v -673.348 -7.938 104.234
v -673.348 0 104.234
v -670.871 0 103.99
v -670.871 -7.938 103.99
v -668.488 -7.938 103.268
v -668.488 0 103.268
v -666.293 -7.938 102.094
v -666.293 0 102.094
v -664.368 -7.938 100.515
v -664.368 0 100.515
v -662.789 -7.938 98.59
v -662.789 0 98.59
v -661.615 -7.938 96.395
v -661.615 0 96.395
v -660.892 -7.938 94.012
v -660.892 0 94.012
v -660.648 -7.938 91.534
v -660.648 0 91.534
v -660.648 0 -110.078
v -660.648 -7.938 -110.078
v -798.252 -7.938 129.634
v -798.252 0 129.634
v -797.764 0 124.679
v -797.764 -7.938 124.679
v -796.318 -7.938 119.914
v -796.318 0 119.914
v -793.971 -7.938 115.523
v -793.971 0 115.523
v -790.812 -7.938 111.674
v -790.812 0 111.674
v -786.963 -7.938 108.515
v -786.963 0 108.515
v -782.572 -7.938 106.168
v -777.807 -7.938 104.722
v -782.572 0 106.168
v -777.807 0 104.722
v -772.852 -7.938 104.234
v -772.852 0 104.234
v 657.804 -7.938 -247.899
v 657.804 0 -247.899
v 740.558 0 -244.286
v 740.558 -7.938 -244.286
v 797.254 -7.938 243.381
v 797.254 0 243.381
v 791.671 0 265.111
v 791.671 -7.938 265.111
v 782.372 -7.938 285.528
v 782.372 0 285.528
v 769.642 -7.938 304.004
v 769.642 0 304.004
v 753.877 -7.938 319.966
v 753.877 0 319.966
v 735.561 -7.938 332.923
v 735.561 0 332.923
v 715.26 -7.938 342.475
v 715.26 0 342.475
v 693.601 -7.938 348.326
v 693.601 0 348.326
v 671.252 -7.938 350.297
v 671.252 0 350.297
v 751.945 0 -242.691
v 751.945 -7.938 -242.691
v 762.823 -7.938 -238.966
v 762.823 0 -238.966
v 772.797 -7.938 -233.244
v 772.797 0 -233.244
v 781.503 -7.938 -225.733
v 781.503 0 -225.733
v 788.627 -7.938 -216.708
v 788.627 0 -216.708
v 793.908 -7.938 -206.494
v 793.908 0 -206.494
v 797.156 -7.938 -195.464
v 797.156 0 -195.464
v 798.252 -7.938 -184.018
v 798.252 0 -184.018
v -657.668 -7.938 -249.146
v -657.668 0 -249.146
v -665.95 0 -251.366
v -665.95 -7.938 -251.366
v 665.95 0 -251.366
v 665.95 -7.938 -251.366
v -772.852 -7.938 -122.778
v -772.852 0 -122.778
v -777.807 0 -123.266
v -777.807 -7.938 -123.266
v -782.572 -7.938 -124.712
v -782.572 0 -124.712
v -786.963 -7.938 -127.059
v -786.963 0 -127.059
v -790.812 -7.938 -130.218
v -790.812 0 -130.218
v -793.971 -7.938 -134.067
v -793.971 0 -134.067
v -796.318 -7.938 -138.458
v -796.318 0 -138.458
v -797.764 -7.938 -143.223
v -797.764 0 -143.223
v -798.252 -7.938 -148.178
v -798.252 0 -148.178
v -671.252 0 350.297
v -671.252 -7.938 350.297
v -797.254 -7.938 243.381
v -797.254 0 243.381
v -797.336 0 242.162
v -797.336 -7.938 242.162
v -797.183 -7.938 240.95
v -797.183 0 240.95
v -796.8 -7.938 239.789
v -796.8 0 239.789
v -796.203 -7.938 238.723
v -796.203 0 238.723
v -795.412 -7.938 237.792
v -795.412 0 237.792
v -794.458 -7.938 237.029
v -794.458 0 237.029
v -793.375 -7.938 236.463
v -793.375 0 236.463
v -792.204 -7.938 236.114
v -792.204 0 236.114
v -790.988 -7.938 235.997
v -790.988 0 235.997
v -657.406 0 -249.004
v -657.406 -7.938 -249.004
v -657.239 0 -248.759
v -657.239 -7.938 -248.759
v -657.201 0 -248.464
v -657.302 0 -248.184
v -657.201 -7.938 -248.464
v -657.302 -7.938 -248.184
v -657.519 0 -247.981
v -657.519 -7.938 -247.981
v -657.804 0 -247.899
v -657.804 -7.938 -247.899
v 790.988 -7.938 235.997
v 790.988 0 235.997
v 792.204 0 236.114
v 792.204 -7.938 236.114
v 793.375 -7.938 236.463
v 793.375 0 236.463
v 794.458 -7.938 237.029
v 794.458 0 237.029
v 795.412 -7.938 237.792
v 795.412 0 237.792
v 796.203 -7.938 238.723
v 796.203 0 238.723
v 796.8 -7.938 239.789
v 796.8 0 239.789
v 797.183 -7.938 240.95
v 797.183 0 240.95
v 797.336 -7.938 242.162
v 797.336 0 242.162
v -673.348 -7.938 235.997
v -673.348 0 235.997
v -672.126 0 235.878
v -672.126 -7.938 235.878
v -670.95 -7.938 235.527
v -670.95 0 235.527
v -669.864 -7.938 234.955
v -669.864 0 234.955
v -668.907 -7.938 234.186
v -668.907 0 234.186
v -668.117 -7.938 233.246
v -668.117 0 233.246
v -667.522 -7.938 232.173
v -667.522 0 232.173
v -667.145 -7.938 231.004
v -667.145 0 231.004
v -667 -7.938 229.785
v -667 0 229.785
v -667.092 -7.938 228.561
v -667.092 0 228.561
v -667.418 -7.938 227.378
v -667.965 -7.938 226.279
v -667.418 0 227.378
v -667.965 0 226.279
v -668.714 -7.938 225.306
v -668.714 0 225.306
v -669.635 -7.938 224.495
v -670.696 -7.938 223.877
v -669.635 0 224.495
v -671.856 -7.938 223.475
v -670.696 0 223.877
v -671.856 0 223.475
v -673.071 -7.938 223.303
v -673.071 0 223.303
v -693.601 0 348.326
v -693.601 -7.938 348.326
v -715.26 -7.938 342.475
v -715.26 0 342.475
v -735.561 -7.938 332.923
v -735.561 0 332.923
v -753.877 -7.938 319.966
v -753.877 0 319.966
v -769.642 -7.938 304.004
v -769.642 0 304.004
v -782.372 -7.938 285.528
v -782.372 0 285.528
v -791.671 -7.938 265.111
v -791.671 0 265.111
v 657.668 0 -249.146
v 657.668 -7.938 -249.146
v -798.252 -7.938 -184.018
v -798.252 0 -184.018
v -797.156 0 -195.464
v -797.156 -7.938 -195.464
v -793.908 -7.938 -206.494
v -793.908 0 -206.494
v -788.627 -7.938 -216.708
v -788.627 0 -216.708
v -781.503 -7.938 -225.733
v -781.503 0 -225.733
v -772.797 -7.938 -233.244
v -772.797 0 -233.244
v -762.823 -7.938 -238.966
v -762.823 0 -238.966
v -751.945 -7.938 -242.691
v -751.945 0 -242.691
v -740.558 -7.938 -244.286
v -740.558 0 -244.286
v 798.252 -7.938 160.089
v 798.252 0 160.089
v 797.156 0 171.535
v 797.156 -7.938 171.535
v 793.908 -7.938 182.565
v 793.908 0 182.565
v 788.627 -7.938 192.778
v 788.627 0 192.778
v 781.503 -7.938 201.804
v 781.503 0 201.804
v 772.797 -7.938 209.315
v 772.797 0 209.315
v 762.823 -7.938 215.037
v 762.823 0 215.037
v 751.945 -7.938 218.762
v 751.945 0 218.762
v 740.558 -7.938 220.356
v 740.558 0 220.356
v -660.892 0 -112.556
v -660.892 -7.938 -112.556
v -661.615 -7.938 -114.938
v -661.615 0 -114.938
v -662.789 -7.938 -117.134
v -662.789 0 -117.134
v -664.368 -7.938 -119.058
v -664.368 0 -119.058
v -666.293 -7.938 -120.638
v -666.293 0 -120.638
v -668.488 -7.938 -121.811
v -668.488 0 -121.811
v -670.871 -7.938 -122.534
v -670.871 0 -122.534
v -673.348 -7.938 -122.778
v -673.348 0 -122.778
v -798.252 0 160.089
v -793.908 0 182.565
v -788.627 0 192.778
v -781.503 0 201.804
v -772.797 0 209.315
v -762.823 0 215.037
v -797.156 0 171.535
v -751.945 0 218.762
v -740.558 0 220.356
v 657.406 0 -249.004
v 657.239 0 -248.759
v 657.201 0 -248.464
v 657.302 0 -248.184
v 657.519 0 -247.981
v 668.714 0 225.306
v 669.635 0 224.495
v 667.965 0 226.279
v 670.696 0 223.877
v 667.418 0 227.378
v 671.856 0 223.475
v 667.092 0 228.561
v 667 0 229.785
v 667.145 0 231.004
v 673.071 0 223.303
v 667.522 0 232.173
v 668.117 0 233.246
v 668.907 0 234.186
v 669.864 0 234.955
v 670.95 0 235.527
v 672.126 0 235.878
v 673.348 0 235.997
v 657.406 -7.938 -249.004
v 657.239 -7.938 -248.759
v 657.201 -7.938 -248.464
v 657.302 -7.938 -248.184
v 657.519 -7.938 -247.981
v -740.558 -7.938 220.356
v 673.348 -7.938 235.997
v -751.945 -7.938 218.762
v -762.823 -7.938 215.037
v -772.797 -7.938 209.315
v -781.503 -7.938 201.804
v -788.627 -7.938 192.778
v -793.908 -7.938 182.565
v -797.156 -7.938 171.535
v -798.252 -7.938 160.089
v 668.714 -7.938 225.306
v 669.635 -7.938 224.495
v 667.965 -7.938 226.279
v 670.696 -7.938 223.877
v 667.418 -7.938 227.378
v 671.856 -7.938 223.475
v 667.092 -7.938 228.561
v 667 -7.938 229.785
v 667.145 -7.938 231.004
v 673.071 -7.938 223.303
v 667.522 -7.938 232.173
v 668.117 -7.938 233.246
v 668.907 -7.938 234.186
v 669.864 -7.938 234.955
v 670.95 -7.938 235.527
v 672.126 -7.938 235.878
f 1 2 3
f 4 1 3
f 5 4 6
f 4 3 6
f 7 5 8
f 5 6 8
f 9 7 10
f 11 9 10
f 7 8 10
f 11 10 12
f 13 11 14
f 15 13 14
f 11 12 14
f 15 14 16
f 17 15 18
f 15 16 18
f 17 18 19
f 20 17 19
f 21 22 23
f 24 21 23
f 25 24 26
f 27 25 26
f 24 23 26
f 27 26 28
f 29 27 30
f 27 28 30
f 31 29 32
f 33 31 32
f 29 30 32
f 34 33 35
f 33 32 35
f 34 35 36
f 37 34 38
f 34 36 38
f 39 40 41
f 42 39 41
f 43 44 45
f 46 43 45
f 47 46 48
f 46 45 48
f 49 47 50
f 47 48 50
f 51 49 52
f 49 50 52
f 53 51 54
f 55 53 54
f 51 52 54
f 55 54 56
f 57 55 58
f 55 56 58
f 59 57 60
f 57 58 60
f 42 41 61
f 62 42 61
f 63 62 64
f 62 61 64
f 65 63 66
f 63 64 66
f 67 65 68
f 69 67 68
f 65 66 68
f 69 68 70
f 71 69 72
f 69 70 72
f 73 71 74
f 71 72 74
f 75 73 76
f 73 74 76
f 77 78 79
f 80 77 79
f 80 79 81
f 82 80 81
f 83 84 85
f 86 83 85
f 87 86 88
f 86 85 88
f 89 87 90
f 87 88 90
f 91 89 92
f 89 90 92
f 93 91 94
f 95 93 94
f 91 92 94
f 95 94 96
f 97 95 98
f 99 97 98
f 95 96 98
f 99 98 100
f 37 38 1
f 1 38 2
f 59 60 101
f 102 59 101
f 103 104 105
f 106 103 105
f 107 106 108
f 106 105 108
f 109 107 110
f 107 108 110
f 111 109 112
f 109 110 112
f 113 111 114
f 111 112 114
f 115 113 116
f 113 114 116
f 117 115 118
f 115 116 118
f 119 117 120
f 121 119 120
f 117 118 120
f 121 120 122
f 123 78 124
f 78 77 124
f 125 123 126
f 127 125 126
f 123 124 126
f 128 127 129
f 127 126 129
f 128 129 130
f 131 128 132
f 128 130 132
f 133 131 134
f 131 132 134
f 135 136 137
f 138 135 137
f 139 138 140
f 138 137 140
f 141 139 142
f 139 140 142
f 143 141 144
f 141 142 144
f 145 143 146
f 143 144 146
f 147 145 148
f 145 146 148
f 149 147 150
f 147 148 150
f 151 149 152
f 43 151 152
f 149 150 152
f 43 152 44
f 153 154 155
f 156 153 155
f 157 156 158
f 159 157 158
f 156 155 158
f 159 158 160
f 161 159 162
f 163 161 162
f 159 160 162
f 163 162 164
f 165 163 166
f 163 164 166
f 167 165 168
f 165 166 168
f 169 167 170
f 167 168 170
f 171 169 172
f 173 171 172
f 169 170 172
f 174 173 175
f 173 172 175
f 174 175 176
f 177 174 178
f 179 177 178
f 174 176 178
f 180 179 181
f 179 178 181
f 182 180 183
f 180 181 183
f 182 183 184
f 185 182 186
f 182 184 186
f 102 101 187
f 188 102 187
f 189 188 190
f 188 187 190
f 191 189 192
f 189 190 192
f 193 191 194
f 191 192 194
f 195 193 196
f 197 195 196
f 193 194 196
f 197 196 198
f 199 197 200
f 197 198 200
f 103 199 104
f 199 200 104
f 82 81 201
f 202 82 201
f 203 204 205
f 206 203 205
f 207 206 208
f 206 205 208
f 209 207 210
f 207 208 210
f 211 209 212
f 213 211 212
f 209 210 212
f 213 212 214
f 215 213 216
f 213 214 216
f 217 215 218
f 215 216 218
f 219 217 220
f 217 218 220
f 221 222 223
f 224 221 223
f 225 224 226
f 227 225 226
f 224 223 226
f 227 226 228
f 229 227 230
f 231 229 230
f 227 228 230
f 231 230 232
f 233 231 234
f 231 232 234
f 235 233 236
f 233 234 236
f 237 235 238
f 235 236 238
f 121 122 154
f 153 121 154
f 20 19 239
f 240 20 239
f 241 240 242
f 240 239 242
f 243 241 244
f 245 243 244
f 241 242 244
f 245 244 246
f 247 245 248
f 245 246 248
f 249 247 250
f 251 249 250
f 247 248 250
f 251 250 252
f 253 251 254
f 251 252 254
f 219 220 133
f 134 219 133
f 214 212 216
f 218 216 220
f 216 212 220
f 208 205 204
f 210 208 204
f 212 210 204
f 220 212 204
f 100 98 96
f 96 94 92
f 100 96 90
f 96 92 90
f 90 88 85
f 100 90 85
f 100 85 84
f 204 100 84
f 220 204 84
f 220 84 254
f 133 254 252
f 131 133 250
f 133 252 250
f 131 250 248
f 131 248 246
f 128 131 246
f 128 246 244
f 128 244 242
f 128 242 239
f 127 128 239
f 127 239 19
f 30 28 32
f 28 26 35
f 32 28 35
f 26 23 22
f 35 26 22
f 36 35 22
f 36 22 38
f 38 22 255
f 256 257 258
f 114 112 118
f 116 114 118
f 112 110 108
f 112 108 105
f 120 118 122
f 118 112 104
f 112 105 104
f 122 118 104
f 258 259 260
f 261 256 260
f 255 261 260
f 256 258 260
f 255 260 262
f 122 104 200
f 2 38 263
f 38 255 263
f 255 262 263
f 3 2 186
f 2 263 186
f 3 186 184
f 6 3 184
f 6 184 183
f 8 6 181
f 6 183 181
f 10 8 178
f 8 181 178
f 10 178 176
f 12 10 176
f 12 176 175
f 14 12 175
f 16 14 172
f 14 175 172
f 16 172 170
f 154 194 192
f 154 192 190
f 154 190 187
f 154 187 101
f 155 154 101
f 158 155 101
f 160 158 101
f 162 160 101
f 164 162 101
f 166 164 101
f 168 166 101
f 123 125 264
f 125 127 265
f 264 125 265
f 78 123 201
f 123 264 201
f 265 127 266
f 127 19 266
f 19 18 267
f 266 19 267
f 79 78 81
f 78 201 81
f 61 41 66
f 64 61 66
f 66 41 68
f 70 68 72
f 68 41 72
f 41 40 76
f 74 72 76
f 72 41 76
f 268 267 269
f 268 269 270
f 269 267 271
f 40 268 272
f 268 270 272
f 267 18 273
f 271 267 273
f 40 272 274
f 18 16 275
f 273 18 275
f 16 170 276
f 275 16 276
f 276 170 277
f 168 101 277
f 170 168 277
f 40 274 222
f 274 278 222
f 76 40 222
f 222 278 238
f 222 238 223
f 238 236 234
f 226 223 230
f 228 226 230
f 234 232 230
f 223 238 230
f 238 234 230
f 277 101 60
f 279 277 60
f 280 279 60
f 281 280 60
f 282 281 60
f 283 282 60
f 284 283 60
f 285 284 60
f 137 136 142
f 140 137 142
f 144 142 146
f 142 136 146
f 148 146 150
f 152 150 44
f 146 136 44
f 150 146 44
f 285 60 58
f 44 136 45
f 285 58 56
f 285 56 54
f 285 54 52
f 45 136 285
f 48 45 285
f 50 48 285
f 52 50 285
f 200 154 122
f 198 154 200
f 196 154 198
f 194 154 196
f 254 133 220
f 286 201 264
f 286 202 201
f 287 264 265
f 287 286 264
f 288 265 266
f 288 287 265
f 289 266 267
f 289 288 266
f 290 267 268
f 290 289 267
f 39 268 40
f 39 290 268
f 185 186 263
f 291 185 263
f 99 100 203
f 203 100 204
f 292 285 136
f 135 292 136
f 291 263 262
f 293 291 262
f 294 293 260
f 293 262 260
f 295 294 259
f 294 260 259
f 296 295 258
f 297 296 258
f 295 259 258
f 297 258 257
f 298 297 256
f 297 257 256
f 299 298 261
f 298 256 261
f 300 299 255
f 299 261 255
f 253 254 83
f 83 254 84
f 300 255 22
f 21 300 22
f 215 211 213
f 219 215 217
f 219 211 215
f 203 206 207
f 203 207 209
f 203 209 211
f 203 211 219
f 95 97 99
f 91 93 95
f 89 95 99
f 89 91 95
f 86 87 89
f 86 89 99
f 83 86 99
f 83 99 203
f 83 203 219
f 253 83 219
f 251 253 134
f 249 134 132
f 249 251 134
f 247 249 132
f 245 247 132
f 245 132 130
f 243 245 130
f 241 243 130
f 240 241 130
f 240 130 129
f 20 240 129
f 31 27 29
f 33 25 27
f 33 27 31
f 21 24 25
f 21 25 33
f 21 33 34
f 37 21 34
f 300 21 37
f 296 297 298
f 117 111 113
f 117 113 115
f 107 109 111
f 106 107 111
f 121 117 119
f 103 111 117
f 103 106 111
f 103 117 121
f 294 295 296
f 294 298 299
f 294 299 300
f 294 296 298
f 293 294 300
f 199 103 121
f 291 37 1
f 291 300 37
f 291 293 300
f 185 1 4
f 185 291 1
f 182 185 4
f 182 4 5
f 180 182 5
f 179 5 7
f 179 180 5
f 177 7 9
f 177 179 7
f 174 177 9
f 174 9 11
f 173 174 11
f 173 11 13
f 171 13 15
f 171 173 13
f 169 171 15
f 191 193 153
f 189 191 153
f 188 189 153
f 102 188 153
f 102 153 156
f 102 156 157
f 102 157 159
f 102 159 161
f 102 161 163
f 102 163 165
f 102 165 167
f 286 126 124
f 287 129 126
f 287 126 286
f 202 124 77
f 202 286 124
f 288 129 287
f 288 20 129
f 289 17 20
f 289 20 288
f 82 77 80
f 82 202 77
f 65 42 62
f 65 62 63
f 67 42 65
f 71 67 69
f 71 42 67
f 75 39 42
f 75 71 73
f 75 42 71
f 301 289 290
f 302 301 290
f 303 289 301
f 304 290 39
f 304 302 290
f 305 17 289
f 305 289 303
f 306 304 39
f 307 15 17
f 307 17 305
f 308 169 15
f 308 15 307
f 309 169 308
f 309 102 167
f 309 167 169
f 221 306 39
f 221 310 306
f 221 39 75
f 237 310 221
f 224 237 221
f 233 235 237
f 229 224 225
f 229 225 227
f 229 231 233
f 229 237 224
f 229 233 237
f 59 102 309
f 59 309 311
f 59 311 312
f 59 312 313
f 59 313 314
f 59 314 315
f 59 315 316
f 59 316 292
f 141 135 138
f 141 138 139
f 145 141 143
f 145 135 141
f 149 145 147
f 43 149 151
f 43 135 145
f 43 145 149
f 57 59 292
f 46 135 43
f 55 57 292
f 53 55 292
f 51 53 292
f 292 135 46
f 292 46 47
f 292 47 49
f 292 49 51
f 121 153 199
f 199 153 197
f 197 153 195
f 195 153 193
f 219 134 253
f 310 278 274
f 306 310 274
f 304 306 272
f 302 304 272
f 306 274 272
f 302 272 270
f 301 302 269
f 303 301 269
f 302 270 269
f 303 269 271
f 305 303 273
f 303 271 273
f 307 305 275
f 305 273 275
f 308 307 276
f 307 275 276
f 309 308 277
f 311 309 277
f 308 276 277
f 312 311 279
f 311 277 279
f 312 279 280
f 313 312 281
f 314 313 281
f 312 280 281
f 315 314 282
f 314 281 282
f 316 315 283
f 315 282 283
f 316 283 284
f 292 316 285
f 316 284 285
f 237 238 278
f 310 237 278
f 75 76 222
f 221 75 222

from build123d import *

# Parameters (mm, degrees)
F1_DEPTH = 7.9375
F2_R     = 0.635


with BuildPart() as f1:
    # F0 (on Front) → F1 (new body)
    with BuildSketch(Plane.XZ):
        with BuildLine():
            Line((-653.682642, -248.07856), (-665.9499, -251.365562))
            Line((-665.9499, -251.365562), (665.9499, -251.365562))
            Line((665.9499, -251.365562), (653.682642, -248.07856))
            Line((653.682642, -248.07856), (740.557894, -244.285505))
            ThreePointArc((740.557894, -244.285505), (781.50316, -225.733446), (798.251554, -184.017921))
            Line((798.251554, -184.017921), (798.251554, 160.088868))
            ThreePointArc((798.251554, 160.088868), (781.50316, 201.804393), (740.557894, 220.356452))
            Line((740.557894, 220.356452), (673.071263, 223.302982))
            ThreePointArc((673.071263, 223.302982), (666.999757, 229.785462), (673.348246, 235.996938))
            Line((673.348246, 235.996938), (790.988303, 235.996938))
            ThreePointArc((790.988303, 235.996938), (795.830132, 238.238509), (797.253598, 243.380659))
            ThreePointArc((797.253598, 243.380659), (753.87662, 319.965956), (671.251554, 350.296938))
            Line((671.251554, 350.296938), (-671.251554, 350.296938))
            ThreePointArc((-671.251554, 350.296938), (-753.87662, 319.965956), (-797.253598, 243.380659))
            ThreePointArc((-797.253598, 243.380659), (-795.830132, 238.238509), (-790.988303, 235.996938))
            Line((-790.988303, 235.996938), (-673.348246, 235.996938))
            ThreePointArc((-673.348246, 235.996938), (-666.999757, 229.785462), (-673.071263, 223.302982))
            Line((-673.071263, 223.302982), (-740.557894, 220.356452))
            ThreePointArc((-740.557894, 220.356452), (-781.50316, 201.804393), (-798.251554, 160.088868))
            Line((-798.251554, 160.088868), (-798.251554, 129.634438))
            ThreePointArc((-798.251554, 129.634438), (-790.812067, 111.673926), (-772.851554, 104.234438))
            Line((-772.851554, 104.234438), (-673.348246, 104.234438))
            ThreePointArc((-673.348246, 104.234438), (-664.36799, 100.514694), (-660.648246, 91.534438))
            Line((-660.648246, 91.534438), (-660.648246, -110.078062))
            ThreePointArc((-660.648246, -110.078062), (-664.36799, -119.058318), (-673.348246, -122.778062))
            Line((-673.348246, -122.778062), (-772.851554, -122.778062))
            ThreePointArc((-772.851554, -122.778062), (-790.812067, -130.21755), (-798.251554, -148.178062))
            Line((-798.251554, -148.178062), (-798.251554, -184.017921))
            ThreePointArc((-798.251554, -184.017921), (-781.50316, -225.733446), (-740.557894, -244.285505))
            Line((-740.557894, -244.285505), (-653.682642, -248.07856))
        make_face()
    extrude(amount=F1_DEPTH)

    # F2
    f2_edges = [f1.edges().sort_by_distance(p)[0] for p in [
        (-653.682642, -3.96875, -248.07856),
        (653.682642, -3.96875, -248.07856),
    ]]
    fillet(f2_edges, radius=F2_R)


solid = f1.part
